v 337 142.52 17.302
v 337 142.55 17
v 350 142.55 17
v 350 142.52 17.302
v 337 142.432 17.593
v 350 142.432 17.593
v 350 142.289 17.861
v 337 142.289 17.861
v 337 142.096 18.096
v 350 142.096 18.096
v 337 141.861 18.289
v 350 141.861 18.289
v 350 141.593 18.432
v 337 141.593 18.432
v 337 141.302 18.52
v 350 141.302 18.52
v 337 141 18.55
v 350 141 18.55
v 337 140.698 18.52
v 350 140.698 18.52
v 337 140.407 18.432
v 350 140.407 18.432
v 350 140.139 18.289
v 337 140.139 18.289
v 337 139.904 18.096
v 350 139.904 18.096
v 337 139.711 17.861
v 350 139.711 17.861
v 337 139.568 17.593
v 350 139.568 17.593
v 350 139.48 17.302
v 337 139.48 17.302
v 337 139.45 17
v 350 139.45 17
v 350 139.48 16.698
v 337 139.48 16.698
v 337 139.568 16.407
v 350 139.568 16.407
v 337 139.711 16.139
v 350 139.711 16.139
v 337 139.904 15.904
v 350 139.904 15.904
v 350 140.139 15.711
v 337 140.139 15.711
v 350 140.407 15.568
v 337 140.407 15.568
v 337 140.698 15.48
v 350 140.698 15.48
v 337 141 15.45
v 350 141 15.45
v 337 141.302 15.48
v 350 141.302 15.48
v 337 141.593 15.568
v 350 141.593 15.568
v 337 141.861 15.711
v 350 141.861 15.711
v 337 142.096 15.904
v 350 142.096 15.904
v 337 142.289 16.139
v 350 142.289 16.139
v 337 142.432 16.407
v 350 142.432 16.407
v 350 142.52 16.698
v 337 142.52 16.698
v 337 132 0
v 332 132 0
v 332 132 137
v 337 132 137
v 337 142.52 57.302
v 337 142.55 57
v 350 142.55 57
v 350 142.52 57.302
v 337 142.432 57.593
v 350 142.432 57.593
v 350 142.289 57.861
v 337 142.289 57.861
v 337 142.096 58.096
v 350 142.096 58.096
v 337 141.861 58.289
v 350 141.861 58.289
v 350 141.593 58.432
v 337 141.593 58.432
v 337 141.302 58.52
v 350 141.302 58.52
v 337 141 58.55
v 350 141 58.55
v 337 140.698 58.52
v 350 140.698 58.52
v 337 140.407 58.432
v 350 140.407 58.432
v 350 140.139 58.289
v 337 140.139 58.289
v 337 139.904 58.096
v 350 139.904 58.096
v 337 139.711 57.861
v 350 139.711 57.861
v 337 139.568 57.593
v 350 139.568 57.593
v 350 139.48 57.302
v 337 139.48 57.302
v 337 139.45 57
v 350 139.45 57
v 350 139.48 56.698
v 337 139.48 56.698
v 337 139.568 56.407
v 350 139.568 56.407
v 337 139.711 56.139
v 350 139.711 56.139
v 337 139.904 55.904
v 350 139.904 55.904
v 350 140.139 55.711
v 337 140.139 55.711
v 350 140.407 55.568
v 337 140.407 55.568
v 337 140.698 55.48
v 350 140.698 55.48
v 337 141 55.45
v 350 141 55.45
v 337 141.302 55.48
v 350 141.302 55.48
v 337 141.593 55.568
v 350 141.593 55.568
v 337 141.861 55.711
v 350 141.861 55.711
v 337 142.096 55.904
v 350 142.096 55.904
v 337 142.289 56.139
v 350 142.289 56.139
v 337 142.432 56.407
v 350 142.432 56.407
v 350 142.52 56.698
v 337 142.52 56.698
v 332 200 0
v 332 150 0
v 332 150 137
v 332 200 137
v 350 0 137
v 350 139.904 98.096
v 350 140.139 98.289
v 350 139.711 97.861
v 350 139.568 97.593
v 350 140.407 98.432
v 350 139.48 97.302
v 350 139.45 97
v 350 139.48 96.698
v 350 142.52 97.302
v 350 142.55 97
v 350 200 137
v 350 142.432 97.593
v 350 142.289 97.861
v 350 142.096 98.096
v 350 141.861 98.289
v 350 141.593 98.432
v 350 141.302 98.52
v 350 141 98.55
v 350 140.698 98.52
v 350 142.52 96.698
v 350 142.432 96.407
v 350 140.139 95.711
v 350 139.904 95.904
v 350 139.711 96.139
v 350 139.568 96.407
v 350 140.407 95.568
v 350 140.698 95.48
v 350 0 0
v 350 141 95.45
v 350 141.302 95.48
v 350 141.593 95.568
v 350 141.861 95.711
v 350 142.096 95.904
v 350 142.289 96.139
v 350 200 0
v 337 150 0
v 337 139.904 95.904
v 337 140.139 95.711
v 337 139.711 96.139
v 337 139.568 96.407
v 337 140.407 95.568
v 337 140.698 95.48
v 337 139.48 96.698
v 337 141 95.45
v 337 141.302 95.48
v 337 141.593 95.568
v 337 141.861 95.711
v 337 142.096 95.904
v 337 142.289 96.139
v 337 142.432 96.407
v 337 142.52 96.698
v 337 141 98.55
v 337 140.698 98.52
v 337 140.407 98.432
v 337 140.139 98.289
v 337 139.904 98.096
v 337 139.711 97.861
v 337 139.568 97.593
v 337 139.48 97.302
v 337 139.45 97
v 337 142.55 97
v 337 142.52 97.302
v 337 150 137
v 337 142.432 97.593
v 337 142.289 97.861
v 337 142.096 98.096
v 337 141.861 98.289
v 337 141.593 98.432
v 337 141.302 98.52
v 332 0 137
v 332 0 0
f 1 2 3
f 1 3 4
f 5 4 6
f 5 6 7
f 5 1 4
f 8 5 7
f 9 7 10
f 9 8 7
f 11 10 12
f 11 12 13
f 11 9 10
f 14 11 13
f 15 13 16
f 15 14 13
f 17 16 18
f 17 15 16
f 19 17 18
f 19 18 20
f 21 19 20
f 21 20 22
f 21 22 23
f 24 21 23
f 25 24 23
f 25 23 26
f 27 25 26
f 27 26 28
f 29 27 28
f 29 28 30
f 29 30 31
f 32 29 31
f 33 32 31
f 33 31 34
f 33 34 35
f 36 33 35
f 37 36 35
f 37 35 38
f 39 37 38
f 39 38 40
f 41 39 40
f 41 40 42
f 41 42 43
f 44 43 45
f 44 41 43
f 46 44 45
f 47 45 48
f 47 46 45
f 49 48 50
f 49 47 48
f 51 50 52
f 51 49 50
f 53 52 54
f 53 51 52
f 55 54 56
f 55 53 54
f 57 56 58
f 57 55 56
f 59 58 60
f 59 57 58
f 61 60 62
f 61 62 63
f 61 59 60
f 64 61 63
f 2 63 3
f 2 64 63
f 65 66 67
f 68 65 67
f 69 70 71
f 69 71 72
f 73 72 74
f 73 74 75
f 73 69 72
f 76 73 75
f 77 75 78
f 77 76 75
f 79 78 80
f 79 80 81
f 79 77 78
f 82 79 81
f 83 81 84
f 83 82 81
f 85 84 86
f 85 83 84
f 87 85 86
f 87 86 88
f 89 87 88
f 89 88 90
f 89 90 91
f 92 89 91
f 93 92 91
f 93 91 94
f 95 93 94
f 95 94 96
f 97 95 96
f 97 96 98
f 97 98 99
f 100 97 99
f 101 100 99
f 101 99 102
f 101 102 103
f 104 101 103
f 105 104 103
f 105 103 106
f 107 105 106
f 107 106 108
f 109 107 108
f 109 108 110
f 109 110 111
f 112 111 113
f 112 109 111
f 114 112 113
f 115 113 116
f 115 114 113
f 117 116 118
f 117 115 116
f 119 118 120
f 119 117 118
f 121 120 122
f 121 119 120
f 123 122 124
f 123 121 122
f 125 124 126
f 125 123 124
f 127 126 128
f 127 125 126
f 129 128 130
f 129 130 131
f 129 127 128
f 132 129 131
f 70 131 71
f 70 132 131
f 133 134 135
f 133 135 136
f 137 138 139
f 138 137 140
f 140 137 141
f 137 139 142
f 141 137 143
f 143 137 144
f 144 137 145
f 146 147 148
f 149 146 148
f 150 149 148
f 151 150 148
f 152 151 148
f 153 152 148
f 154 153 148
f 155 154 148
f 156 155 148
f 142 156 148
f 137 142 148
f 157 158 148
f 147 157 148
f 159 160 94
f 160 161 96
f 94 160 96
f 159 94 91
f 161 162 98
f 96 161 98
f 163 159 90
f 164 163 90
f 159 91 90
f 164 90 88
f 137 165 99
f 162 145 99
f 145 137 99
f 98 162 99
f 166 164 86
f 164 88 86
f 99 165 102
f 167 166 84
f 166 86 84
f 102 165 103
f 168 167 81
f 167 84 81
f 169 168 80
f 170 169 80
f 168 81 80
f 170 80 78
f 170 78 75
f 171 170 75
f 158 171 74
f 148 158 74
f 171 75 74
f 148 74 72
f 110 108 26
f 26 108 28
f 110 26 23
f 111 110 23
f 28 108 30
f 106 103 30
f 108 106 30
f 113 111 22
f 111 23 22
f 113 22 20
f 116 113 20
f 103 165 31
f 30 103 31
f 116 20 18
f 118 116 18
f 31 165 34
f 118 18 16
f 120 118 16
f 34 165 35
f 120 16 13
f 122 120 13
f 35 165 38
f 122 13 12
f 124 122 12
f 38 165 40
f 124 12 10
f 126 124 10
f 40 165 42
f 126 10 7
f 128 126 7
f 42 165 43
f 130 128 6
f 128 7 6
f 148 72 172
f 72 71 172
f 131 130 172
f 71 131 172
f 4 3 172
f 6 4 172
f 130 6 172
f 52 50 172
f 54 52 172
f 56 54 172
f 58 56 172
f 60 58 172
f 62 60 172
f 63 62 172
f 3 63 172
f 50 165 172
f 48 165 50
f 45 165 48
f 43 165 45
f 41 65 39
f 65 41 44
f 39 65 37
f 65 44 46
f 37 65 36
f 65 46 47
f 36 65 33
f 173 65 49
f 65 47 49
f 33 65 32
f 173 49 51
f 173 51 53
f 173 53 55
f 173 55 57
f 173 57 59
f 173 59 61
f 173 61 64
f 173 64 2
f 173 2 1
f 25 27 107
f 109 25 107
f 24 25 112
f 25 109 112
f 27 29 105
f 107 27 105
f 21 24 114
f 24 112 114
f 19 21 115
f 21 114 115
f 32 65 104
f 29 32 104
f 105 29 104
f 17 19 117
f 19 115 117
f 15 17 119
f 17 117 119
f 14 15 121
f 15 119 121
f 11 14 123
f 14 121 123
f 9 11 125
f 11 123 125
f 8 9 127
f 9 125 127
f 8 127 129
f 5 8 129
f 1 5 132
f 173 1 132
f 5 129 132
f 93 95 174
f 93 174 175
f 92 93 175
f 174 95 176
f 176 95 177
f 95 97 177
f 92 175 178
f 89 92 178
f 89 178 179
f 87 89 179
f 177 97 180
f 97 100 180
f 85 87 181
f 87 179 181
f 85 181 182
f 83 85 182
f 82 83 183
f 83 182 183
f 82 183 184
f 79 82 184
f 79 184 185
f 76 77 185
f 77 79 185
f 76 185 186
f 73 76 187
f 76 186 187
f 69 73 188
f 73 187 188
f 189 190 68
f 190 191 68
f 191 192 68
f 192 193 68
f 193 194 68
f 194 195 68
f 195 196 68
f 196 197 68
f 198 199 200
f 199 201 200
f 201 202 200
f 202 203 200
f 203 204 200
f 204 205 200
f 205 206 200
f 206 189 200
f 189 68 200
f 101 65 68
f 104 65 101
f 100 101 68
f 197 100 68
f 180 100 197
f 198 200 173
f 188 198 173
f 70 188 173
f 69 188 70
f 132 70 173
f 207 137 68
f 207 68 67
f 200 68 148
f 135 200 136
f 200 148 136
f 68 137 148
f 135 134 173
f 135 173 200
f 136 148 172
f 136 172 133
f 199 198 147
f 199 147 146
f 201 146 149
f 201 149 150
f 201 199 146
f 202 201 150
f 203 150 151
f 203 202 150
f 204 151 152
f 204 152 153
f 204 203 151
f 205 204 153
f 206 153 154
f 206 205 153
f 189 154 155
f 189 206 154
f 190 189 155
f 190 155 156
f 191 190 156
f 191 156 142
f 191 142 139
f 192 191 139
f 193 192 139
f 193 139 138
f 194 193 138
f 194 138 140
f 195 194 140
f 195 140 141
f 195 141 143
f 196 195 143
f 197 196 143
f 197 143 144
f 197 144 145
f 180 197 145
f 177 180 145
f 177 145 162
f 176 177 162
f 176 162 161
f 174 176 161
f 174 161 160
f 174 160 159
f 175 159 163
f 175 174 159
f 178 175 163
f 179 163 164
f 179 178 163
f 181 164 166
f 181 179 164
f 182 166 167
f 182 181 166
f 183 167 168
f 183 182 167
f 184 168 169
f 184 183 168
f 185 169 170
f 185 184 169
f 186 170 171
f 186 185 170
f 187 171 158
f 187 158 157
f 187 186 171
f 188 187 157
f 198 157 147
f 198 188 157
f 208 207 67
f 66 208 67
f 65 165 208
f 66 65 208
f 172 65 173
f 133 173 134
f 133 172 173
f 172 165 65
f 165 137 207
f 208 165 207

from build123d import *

# Parameters (mm, degrees)
BOX_W           = 18
BOX_H           = 200
BOX_DEPTH       = 137
SKETCH001_W     = 18
SKETCH001_H     = 137
POCKET001_DEPTH = 5
SKETCH003_R     = 1.55
HOLE_DEPTH      = 13.001


with BuildPart() as body002:
    # Box → Box (new body)
    with BuildSketch(Plane.XY):
        with Locations((9, 100)):
            Rectangle(BOX_W, BOX_H)
    extrude(amount=BOX_DEPTH)

    # Sketch001 (on Face2 of BaseFeature001) → Pocket001 (cut)
    with BuildSketch(Plane.YZ.offset(18)):
        with Locations((141, 68.5)):
            Rectangle(SKETCH001_W, SKETCH001_H)
    extrude(amount=-POCKET001_DEPTH, mode=Mode.SUBTRACT)

    # Sketch003 (on Face9 of Pocket001) → Hole (cut, through all)
    with BuildSketch(Plane.YZ.offset(13)):
        with Locations((141, 97)):
            Circle(SKETCH003_R)
        with Locations((141, 57)):
            Circle(SKETCH003_R)
        with Locations((141, 17)):
            Circle(SKETCH003_R)
    extrude(amount=-HOLE_DEPTH, mode=Mode.SUBTRACT)


with BuildPart() as rightleg:
    # Part__Mirroring: instance of Body002
    add(body002.part.mirror(Plane(origin=(0, 0, 0), x_dir=(0, -1, 0), z_dir=(1, 0, 0))))


with BuildPart() as rightleg_1:
    # Part__Mirroring placement: moved
    add(rightleg.part.moved(Location((350, 0, 0))))


solid = rightleg_1.part
